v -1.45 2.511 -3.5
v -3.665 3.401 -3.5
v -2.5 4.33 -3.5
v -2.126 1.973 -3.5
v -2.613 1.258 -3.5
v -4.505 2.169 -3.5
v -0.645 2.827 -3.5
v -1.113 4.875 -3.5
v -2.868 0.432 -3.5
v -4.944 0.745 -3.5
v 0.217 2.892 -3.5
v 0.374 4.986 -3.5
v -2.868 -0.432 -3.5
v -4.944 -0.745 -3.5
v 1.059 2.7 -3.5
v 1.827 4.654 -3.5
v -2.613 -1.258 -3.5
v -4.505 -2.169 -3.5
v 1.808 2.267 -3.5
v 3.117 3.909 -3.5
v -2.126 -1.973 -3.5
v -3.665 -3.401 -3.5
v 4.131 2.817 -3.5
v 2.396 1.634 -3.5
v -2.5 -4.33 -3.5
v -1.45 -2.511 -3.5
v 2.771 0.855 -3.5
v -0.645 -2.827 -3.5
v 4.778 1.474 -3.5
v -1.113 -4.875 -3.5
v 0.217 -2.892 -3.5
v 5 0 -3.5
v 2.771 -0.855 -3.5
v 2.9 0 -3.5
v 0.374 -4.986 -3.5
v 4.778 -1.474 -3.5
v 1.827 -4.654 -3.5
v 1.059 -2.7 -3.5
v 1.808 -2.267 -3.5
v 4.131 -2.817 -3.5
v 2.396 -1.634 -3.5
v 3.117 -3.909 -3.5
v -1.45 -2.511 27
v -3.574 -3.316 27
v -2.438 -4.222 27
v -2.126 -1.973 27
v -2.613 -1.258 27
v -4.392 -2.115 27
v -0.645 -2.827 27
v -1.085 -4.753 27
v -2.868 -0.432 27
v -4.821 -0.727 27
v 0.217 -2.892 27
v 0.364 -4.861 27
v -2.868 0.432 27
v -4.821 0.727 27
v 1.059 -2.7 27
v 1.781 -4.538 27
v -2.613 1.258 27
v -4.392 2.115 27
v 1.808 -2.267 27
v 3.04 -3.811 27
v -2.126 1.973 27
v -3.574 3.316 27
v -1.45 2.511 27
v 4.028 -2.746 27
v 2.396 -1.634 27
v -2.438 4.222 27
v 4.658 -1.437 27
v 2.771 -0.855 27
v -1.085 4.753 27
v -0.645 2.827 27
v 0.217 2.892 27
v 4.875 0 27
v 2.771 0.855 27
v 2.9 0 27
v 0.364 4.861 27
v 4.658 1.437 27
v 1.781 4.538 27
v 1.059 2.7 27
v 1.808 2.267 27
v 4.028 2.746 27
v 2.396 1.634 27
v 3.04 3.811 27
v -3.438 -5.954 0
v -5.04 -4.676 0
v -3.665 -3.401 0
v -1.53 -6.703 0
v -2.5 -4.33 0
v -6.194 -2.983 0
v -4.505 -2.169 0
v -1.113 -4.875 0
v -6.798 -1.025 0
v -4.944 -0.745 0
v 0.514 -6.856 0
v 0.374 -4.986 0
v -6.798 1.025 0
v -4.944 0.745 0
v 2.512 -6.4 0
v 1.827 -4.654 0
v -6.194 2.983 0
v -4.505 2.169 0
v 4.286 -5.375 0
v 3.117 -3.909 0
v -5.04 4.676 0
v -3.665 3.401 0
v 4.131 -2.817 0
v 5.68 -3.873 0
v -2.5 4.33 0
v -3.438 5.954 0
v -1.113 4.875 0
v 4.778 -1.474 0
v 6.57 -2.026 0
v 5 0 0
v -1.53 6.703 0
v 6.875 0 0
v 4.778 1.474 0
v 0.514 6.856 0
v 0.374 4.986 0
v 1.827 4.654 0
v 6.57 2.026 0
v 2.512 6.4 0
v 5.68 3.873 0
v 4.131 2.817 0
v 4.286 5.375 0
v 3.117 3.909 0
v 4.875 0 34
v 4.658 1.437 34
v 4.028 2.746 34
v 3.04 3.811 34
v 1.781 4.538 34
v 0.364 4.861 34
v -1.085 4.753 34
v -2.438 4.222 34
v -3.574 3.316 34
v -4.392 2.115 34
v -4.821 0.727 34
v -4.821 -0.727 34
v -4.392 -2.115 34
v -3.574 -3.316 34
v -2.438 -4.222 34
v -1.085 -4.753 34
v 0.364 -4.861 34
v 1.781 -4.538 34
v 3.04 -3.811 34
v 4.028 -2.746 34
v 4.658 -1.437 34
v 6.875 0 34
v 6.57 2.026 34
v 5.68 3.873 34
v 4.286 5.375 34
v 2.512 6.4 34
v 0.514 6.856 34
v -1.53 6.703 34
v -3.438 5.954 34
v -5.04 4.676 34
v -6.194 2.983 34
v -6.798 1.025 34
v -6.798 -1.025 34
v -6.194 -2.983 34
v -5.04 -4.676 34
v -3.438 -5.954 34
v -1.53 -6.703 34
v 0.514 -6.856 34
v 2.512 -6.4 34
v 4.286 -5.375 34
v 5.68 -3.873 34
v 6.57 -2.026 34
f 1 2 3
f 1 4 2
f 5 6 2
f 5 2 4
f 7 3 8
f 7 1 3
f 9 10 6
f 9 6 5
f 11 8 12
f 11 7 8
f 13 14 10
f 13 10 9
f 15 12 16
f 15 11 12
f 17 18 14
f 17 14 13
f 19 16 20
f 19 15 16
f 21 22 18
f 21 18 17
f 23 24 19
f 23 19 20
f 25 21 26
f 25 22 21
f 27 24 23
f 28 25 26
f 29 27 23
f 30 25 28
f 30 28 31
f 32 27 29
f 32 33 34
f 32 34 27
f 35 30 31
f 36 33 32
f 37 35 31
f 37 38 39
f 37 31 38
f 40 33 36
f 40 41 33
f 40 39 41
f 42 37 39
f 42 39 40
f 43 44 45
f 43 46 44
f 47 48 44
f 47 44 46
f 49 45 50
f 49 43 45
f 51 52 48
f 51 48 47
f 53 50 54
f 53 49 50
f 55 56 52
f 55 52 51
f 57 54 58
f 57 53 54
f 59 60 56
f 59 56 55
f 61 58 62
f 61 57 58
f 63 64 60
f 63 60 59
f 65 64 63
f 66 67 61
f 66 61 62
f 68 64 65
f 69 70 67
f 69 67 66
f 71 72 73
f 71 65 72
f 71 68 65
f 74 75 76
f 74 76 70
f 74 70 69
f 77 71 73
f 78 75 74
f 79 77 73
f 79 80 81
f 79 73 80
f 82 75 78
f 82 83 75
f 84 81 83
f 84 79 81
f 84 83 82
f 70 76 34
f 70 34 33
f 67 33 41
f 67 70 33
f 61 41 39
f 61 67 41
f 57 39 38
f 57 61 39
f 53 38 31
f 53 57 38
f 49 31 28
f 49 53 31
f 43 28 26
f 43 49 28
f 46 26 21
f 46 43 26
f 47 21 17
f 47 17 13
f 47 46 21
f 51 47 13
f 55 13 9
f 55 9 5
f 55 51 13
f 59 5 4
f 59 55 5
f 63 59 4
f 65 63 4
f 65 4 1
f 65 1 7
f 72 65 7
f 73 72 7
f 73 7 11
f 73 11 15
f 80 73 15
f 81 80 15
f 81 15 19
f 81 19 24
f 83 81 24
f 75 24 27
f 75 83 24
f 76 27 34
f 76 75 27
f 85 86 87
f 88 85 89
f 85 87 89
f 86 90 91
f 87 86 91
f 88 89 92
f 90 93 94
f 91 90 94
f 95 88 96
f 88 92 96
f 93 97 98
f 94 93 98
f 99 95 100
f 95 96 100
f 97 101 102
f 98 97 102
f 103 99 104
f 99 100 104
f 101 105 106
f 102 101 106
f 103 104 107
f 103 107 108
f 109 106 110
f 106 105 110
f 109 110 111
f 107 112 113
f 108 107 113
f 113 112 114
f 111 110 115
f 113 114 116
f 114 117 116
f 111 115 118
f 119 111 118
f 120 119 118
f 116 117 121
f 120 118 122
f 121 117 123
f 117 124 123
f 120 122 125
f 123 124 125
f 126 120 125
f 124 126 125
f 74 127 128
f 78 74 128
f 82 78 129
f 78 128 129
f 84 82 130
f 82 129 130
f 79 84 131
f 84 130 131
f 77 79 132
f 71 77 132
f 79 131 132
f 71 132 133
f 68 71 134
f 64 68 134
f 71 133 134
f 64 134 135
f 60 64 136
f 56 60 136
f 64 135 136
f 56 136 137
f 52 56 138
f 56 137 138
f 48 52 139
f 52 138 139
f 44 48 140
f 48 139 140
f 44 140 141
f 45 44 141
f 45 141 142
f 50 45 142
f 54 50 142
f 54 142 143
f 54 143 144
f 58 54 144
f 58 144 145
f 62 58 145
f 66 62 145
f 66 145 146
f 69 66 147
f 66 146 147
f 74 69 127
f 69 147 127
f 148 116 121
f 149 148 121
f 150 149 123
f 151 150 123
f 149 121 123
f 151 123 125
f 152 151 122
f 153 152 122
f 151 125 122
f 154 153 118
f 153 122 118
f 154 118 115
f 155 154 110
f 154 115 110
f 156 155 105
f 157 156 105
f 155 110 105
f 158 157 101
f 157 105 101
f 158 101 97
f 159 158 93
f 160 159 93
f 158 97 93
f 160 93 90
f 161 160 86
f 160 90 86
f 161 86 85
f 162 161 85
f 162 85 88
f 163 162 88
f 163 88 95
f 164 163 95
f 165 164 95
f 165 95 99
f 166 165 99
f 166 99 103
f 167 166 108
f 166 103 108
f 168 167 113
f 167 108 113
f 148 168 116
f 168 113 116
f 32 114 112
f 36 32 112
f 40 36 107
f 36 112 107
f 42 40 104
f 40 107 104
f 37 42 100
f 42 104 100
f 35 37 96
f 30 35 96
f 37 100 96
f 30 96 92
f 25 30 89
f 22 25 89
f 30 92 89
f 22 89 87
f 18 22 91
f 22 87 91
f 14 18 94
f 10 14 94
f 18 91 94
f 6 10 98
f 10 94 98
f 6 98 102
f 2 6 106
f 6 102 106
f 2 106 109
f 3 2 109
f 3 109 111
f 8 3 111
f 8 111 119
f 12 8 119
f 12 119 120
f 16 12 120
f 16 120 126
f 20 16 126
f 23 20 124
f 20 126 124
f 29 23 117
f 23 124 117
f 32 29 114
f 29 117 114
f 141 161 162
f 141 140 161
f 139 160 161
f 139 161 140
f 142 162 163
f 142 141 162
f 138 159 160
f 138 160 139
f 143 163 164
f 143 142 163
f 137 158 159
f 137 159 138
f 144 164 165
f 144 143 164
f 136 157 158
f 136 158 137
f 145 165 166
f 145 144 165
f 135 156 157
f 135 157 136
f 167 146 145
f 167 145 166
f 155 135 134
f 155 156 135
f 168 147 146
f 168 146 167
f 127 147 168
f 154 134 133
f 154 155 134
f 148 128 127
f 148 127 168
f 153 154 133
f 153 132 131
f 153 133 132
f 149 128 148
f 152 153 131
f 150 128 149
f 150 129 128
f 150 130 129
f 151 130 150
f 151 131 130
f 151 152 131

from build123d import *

# Parameters (mm, degrees)
F0_R     = 6.875
F0_R_2   = 2.9
F1_DEPTH = 34
F2_R     = 5
F2_R_2   = 2.9
F3_DEPTH = 3.5
F4_R     = 4.875
F5_DEPTH = 7


with BuildPart() as f1:
    # F0 (on Top) → F1 (new body)
    with BuildSketch(Plane.XY):
        Circle(F0_R)
        Circle(F0_R_2, mode=Mode.SUBTRACT)
    extrude(amount=F1_DEPTH)

    # F2 (on face) → F3 (join)
    with BuildSketch(Plane(origin=(0, 0, 0), x_dir=(1, 0, 0), z_dir=(0, 0, -1))):
        Circle(F2_R)
        Circle(F2_R_2, mode=Mode.SUBTRACT)
    extrude(amount=F3_DEPTH)

    # F4 (on face) → F5 (cut)
    with BuildSketch(Plane.XY.offset(34)):
        Circle(F4_R)
    extrude(amount=-F5_DEPTH, mode=Mode.SUBTRACT)


solid = f1.part
